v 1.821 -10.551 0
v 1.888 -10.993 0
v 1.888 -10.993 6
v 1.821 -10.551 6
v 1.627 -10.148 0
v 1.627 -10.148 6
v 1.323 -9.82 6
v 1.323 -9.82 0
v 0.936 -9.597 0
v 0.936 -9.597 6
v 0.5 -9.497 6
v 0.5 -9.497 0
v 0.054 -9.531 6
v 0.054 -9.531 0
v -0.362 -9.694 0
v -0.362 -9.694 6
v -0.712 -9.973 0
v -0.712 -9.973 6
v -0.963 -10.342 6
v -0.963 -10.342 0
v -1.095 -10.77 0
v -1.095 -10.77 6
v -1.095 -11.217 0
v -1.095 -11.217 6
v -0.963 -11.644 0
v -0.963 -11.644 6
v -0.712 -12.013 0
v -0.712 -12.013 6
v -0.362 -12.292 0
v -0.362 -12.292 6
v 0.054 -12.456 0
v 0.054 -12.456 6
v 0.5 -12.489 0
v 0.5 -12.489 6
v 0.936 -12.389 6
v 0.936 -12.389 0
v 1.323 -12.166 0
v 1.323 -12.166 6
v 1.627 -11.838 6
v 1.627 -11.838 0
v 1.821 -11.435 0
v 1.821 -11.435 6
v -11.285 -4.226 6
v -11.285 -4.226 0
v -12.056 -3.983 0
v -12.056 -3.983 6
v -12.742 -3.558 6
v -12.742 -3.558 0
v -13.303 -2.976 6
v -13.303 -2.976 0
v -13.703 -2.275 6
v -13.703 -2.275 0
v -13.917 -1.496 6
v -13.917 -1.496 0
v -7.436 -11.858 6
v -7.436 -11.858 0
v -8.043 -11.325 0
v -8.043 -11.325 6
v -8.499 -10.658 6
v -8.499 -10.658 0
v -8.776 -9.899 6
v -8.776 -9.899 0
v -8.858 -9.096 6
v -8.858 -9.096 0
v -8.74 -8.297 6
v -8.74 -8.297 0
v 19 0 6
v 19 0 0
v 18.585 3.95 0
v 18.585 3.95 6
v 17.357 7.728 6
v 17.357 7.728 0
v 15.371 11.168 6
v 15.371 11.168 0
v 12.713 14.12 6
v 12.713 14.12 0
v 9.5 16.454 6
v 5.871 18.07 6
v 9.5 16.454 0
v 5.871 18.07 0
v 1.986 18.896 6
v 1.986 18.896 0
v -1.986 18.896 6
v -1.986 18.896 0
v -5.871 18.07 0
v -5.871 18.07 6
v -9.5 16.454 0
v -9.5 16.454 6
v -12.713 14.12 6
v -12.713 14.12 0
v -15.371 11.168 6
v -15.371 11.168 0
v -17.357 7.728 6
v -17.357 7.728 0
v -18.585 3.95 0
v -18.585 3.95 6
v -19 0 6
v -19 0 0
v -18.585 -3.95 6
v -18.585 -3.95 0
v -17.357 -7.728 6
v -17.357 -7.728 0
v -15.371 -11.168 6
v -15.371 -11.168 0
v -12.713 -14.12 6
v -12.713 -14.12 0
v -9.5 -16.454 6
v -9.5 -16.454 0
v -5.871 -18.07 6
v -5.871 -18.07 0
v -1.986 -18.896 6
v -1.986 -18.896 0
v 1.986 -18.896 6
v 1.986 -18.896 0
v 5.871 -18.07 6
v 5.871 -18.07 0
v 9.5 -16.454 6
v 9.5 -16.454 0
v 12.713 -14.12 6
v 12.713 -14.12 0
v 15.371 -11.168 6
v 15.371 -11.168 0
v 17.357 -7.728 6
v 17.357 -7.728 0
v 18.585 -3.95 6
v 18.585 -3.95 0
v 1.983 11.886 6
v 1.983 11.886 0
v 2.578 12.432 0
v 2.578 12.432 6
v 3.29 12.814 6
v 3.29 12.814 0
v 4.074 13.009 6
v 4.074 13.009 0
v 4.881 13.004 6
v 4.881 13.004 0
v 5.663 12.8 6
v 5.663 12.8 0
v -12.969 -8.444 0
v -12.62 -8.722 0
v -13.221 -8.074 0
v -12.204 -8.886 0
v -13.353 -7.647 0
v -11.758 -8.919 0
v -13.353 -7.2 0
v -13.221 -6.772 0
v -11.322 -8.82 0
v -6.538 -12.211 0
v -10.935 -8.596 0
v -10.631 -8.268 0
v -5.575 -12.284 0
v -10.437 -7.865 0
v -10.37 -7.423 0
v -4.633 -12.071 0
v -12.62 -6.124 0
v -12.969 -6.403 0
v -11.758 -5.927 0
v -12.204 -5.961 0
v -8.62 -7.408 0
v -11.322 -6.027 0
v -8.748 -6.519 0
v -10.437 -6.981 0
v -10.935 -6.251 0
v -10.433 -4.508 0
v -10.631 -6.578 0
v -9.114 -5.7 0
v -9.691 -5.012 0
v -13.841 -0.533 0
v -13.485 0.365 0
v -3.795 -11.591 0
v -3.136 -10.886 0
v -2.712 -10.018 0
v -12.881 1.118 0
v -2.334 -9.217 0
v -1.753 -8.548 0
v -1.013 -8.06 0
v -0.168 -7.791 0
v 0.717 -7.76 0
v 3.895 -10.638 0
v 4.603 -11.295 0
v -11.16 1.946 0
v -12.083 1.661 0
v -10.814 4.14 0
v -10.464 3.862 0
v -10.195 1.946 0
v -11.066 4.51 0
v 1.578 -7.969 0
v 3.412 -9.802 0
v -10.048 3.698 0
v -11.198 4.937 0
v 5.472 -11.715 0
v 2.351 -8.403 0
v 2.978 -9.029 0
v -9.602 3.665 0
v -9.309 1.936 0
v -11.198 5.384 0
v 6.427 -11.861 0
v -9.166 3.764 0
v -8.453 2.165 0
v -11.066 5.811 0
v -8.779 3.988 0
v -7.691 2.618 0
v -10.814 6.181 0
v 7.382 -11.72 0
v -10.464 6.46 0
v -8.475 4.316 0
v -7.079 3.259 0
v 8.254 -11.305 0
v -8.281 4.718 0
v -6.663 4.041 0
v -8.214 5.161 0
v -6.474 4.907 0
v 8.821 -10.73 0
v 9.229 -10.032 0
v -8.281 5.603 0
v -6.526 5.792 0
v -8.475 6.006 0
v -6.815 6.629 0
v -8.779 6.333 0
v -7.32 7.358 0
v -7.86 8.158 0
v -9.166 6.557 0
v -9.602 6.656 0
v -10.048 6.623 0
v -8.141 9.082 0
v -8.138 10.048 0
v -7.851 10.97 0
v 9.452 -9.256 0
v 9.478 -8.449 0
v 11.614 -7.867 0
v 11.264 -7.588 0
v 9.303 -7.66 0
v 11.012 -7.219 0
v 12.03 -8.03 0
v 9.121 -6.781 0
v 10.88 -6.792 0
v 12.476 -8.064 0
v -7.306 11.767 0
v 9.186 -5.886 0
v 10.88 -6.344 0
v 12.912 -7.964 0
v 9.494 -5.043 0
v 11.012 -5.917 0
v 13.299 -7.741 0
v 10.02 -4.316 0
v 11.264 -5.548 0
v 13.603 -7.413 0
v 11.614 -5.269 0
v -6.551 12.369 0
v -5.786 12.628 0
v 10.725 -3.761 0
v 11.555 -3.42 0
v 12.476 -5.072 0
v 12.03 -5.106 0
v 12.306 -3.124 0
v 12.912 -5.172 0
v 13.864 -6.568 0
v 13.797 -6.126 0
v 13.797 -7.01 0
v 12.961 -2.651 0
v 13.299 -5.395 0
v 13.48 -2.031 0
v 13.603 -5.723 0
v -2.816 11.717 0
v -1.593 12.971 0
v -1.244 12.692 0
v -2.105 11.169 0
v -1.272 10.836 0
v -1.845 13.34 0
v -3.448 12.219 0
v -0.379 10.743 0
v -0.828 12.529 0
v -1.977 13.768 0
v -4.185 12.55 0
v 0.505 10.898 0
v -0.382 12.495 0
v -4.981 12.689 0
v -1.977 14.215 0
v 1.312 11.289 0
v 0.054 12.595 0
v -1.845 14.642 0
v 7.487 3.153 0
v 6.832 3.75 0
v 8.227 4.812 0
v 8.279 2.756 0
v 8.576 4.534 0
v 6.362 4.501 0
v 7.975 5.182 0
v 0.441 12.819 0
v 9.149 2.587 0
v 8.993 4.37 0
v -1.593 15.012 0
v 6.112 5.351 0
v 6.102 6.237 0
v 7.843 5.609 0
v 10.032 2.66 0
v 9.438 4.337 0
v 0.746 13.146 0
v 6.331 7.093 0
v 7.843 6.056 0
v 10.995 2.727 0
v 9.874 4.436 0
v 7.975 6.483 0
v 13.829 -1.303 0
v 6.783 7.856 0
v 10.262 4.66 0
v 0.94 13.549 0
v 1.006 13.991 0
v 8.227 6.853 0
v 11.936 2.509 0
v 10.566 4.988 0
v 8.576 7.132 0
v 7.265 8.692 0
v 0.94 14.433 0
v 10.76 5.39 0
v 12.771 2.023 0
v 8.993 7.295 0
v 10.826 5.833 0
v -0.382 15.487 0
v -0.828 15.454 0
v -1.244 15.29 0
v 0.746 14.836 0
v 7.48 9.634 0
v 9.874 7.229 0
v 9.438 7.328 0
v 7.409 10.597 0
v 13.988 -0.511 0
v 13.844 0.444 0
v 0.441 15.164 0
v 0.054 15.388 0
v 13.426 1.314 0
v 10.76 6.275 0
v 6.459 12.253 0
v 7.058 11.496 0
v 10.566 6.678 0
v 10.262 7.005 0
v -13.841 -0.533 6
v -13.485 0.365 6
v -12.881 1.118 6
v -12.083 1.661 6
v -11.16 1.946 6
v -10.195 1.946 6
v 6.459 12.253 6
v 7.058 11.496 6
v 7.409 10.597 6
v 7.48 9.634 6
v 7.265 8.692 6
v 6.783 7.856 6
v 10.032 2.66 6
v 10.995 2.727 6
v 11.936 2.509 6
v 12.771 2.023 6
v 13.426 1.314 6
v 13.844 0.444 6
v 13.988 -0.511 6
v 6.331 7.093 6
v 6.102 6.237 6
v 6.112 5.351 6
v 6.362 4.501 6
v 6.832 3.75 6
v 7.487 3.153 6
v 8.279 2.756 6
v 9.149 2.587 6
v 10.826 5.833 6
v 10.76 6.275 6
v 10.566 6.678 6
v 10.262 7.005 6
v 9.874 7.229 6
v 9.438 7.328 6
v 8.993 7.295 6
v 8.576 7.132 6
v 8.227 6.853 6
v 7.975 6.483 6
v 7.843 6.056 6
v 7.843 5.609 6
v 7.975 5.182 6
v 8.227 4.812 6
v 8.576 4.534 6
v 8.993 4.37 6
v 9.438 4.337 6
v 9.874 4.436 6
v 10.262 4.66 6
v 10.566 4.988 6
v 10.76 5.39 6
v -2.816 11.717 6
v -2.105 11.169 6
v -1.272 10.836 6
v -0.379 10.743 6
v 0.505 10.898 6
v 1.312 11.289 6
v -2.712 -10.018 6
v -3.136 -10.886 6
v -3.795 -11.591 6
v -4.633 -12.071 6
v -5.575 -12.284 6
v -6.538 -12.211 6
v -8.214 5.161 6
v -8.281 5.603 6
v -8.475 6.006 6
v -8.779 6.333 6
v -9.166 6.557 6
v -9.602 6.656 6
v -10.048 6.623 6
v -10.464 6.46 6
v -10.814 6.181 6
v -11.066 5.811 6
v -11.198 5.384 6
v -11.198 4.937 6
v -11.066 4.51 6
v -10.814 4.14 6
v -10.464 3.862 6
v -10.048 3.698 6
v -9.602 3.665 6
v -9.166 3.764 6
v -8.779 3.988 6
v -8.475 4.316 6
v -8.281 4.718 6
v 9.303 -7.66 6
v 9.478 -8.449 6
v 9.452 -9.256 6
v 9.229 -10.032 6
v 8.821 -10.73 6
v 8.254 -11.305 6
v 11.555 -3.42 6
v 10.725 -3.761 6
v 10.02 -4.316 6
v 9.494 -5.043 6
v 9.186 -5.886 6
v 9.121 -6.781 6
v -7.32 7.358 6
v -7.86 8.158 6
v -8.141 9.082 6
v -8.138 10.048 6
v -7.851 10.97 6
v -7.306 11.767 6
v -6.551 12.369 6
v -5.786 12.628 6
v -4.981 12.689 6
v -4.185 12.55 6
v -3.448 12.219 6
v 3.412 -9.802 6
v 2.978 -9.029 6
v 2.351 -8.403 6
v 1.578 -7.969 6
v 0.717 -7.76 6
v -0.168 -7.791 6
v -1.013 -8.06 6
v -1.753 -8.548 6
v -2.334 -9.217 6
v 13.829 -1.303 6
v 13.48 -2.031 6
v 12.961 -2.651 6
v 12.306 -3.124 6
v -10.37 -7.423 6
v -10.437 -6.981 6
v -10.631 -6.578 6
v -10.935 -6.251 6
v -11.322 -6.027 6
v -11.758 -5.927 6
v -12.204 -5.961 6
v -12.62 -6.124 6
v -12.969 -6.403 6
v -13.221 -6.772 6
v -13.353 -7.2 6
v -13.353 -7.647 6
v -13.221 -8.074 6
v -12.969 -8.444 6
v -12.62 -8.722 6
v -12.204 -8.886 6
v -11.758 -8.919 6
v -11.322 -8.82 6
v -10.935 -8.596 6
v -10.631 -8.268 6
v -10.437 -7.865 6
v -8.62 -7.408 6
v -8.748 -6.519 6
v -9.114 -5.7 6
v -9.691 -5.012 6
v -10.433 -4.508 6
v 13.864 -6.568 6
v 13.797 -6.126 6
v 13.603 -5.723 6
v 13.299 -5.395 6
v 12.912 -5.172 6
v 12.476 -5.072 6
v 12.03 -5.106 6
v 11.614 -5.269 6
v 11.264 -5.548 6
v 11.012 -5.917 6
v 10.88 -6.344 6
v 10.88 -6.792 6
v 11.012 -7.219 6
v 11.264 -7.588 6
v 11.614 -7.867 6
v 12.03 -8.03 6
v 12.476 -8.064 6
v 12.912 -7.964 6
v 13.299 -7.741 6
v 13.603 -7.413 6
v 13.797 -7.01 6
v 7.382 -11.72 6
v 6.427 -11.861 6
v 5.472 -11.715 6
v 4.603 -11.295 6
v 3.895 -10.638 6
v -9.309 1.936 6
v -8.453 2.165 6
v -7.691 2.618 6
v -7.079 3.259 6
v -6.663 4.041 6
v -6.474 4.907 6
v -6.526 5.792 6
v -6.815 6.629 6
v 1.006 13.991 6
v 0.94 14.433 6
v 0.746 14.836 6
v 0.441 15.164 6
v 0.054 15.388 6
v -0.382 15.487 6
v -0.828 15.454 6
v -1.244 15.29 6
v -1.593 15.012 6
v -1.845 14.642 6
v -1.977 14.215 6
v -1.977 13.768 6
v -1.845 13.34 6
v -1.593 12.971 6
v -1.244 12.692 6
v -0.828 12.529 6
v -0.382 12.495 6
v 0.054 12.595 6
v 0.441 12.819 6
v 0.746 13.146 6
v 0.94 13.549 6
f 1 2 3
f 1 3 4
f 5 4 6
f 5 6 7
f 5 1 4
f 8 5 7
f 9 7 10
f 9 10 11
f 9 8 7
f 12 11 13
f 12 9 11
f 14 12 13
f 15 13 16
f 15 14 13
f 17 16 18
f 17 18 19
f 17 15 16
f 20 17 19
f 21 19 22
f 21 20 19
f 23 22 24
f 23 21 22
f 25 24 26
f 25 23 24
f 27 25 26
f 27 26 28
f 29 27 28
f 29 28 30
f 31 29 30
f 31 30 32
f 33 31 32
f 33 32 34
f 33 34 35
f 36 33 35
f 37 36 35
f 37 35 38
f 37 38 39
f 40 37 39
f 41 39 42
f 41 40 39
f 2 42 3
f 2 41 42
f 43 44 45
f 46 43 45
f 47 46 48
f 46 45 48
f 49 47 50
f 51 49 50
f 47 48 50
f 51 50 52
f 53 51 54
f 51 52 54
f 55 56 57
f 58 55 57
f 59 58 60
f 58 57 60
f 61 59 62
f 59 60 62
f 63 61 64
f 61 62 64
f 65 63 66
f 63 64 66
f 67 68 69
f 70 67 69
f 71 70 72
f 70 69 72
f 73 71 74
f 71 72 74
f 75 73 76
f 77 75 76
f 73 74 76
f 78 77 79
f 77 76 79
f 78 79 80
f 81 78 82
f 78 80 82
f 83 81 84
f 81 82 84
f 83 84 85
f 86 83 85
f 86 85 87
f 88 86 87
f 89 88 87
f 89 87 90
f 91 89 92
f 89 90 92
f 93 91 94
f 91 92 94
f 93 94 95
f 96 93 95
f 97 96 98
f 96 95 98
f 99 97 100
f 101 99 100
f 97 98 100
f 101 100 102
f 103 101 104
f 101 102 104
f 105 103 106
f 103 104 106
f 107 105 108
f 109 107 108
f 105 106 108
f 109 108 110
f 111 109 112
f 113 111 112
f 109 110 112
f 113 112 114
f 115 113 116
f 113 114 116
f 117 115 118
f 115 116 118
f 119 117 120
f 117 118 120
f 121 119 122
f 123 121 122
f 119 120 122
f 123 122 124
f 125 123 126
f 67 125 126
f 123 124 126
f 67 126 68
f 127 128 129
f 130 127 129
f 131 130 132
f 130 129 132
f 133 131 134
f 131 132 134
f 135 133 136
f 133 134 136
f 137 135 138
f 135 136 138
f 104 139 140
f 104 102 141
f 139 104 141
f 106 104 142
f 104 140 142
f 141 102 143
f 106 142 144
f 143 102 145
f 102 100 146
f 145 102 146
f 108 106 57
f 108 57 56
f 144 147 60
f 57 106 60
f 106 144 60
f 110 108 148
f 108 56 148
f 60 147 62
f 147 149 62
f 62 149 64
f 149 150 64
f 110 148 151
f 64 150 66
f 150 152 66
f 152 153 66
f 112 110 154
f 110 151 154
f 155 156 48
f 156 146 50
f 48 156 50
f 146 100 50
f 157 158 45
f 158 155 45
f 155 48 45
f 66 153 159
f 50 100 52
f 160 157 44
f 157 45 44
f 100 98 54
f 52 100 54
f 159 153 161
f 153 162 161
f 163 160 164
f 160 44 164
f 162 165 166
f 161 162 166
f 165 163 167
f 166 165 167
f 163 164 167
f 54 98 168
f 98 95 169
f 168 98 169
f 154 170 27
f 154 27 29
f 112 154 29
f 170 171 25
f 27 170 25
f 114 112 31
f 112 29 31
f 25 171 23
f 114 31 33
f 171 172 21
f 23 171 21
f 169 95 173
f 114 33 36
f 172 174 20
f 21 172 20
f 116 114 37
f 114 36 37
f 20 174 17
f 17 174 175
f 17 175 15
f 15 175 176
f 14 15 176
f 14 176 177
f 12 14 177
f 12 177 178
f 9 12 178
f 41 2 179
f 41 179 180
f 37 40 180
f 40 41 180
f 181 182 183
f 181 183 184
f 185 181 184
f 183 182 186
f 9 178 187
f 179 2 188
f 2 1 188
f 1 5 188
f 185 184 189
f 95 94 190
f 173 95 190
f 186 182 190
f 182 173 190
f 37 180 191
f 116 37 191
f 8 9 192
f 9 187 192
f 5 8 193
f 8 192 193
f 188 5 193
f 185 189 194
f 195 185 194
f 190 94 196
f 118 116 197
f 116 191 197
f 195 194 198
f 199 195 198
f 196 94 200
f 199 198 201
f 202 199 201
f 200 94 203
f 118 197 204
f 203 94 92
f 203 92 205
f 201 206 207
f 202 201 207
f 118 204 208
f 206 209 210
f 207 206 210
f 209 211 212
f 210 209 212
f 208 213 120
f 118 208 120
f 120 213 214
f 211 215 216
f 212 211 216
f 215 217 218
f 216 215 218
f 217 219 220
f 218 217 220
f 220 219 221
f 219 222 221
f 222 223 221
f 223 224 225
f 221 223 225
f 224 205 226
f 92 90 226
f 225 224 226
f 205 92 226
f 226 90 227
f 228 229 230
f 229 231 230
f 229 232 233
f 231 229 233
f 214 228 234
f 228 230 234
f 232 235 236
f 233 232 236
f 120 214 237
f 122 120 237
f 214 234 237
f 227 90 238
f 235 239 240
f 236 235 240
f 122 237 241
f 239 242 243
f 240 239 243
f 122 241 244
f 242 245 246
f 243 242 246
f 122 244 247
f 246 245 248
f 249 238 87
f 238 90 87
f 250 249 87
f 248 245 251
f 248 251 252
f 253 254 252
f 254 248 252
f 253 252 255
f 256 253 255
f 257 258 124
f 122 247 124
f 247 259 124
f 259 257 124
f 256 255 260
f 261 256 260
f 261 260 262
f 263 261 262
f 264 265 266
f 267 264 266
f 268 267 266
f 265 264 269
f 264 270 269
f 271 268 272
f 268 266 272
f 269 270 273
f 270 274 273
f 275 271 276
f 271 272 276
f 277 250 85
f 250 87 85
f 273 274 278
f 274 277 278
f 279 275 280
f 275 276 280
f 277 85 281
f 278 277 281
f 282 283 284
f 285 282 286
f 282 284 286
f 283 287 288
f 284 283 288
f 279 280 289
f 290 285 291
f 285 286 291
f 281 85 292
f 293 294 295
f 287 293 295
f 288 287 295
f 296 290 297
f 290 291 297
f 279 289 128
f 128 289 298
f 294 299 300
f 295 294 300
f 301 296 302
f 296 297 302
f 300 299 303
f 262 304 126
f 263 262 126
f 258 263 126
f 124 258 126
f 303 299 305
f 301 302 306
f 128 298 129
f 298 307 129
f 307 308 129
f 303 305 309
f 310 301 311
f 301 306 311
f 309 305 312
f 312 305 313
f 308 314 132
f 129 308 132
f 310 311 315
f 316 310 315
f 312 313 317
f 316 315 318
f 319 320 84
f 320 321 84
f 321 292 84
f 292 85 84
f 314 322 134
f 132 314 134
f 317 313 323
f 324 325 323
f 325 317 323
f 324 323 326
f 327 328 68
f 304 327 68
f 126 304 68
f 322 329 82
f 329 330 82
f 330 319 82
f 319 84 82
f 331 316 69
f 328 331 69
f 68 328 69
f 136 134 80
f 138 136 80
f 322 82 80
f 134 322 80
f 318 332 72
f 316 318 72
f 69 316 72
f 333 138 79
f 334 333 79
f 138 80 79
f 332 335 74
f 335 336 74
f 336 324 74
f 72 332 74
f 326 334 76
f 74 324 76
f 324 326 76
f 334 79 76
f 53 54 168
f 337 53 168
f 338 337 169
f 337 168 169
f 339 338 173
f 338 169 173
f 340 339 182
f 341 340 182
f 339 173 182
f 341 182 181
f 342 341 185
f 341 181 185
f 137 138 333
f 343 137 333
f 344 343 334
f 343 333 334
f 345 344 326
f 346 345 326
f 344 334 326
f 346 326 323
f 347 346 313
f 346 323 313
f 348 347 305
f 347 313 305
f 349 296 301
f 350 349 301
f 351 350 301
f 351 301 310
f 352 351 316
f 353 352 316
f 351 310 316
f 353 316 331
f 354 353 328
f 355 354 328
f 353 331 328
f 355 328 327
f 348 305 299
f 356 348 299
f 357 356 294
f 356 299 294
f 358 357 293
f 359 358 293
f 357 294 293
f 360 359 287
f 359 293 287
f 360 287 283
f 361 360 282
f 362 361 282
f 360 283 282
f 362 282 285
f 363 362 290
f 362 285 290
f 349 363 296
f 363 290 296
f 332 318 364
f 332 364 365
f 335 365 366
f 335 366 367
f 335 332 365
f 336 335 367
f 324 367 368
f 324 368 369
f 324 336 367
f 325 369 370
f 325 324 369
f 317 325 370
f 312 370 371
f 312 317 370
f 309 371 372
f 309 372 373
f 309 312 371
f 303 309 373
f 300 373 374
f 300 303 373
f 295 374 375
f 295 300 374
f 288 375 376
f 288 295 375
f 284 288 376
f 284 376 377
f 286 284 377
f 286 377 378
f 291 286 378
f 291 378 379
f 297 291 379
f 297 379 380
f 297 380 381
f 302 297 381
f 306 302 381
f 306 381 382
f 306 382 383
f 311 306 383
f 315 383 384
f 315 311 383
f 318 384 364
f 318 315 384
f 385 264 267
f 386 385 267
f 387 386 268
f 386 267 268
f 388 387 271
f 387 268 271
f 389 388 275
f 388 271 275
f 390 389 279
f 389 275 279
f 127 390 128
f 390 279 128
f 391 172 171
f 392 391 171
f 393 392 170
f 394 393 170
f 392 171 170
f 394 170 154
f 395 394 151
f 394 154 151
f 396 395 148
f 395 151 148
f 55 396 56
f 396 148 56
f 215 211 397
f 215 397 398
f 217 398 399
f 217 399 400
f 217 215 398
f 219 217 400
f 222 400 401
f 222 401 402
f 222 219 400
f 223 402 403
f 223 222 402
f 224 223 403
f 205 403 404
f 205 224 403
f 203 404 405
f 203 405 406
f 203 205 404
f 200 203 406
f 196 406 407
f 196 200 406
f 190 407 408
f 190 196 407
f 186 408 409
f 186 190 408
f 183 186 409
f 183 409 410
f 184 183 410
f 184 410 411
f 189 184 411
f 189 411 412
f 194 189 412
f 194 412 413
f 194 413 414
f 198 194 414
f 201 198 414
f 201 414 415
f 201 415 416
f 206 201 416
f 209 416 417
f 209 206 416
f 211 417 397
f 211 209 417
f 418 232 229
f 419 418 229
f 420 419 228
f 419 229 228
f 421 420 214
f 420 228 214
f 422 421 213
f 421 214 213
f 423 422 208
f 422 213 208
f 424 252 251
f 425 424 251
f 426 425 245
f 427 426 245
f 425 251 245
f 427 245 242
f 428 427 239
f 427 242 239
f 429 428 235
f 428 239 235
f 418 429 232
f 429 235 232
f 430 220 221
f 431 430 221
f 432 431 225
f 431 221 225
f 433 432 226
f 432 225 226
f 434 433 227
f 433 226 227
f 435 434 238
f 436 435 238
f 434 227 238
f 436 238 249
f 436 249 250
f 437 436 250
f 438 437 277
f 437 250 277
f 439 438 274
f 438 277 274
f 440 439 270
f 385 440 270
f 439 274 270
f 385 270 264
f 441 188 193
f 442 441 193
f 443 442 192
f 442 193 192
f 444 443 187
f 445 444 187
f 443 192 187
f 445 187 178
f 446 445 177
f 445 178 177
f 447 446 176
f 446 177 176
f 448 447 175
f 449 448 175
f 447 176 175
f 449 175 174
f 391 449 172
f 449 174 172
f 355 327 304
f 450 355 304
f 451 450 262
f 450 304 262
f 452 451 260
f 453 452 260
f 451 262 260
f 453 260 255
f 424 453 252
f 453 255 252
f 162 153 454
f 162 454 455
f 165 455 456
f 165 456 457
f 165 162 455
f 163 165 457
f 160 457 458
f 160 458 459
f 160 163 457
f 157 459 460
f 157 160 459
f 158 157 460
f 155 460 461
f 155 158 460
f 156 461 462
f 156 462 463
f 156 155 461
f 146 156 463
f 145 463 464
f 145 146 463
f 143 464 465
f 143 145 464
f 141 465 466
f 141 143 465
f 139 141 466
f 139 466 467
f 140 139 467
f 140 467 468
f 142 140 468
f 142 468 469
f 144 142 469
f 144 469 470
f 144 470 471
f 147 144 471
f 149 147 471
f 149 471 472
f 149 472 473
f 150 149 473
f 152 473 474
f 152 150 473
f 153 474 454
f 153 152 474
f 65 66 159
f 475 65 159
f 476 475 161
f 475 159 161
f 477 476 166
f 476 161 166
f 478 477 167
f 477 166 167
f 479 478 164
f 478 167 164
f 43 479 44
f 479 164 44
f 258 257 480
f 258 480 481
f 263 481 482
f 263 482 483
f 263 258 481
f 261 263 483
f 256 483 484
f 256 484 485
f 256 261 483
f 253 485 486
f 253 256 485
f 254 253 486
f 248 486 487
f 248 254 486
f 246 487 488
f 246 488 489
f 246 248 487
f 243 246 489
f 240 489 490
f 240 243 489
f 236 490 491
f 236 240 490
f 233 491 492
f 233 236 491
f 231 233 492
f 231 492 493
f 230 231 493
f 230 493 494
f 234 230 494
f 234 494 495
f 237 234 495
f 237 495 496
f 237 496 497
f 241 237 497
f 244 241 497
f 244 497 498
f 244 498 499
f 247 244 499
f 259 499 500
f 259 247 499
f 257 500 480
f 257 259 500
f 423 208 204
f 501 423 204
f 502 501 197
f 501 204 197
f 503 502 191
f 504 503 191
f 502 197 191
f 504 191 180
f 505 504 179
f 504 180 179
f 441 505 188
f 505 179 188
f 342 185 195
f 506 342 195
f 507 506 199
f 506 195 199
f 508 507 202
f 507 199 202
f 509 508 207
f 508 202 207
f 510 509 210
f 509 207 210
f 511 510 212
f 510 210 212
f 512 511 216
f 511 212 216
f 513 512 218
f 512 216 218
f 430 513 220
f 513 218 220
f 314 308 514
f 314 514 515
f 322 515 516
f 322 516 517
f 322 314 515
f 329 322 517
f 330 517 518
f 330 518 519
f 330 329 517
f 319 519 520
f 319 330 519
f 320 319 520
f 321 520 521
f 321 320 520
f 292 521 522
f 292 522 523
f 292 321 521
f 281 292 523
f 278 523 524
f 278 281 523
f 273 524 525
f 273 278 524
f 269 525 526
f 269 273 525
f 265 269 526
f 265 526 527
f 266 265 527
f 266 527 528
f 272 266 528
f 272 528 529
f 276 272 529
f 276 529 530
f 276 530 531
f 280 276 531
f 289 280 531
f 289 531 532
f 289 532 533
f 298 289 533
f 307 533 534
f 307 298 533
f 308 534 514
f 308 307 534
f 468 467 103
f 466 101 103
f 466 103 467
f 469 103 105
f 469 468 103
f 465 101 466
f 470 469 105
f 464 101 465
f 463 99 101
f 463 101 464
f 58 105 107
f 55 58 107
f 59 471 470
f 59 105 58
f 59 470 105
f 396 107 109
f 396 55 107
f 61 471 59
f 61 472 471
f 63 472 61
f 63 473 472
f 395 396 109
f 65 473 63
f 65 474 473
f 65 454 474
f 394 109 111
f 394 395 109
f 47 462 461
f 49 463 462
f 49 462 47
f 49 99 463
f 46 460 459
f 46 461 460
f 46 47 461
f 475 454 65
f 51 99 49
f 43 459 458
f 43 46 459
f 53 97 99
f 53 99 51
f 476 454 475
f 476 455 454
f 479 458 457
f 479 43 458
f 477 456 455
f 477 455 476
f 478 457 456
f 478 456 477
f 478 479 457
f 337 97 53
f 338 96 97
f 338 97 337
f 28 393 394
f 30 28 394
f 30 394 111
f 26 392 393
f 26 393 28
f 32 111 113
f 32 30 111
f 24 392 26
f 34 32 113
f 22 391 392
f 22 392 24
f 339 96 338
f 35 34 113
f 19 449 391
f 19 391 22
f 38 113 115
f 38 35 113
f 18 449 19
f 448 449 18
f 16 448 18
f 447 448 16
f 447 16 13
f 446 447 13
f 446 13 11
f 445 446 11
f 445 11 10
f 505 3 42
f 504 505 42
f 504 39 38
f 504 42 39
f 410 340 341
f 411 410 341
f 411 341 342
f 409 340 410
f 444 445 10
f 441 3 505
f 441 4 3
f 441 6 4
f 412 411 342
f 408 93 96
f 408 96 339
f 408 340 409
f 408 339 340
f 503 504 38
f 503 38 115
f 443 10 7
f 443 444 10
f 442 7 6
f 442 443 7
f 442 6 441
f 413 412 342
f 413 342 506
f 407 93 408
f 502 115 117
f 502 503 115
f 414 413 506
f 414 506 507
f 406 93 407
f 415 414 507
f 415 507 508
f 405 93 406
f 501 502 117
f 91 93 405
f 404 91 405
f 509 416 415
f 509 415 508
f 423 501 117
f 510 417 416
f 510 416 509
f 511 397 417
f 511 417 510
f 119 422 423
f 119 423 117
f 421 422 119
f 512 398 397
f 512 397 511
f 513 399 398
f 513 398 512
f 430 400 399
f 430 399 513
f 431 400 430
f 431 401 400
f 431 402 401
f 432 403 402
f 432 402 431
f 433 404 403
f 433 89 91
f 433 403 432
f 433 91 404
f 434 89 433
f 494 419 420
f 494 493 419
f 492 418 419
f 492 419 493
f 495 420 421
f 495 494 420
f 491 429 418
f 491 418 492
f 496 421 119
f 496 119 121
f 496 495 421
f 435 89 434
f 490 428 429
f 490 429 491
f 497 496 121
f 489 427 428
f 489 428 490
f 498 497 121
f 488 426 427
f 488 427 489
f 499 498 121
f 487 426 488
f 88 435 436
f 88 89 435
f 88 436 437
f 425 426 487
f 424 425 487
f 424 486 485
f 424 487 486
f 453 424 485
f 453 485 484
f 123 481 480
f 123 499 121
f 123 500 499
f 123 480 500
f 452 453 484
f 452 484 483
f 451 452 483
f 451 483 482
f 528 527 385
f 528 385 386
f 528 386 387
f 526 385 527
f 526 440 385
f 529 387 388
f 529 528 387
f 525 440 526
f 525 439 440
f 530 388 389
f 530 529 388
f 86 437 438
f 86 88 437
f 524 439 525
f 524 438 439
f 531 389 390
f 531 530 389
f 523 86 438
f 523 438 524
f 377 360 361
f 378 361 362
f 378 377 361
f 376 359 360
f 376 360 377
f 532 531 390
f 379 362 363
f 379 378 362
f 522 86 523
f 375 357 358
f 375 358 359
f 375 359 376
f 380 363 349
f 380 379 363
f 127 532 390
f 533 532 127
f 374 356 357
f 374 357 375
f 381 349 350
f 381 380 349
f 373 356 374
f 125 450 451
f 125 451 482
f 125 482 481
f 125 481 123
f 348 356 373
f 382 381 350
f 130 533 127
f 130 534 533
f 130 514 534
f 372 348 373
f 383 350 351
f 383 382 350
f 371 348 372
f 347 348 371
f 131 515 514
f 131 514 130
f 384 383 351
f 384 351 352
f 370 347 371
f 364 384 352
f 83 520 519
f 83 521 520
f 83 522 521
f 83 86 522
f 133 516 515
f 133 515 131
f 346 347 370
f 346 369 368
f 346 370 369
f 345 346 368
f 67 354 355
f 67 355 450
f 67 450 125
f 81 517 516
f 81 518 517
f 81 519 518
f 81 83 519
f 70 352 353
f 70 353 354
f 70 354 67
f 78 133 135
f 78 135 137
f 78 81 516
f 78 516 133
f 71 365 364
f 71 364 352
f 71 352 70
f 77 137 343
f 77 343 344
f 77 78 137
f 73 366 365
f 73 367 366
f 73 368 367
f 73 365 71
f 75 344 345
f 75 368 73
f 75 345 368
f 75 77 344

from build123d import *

# Parameters (mm, degrees)
ESQUISSE1_R        = 19
ESQUISSE1_R_2      = 1.5
BOSS_EXTRU_2_DEPTH = 6


with BuildPart() as part:
    # Esquisse1 → Boss.-Extru.2 (new body)
    with BuildSketch(Plane.XY):
        Circle(ESQUISSE1_R)
        with Locations((-0.493805045, 13.991288596)):
            Circle(ESQUISSE1_R_2, mode=Mode.SUBTRACT)
        with Locations((12.363713879, -6.567996584)):
            Circle(ESQUISSE1_R_2, mode=Mode.SUBTRACT)
        with Locations((-11.869908833, -7.423292012)):
            Circle(ESQUISSE1_R_2, mode=Mode.SUBTRACT)
        with Locations((-9.714346619, 5.160568745)):
            Circle(ESQUISSE1_R_2, mode=Mode.SUBTRACT)
        with Locations((9.32635694, 5.832586581)):
            Circle(ESQUISSE1_R_2, mode=Mode.SUBTRACT)
        with Locations((0.387989679, -10.993155325)):
            Circle(ESQUISSE1_R_2, mode=Mode.SUBTRACT)
        with BuildLine():
            ThreePointArc((-2.815595301, 11.717131607), (-0.379171731, 10.743310886), (1.982535482, 11.886475637))
            ThreePointArc((1.982535482, 11.886475637), (3.675716254, 12.935891711), (5.663115611, 12.800322476))
            ThreePointArc((5.663115611, 12.800322476), (7.409047573, 10.596596907), (6.782830345, 7.855696182))
            ThreePointArc((6.782830345, 7.855696182), (6.57084239, 4.109322364), (10.032070946, 2.660132051))
            ThreePointArc((10.032070946, 2.660132051), (12.770566856, 2.023480694), (13.987784639, -0.510896087))
            ThreePointArc((13.987784639, -0.510896087), (13.239790253, -2.357146239), (11.555131282, -3.420188746))
            ThreePointArc((11.555131282, -3.420188746), (9.493566014, -5.043283091), (9.302722122, -7.66016391))
            ThreePointArc((9.302722122, -7.66016391), (9.364952716, -9.651209509), (8.253846635, -11.304563222))
            ThreePointArc((8.253846635, -11.304563222), (5.472398329, -11.71472187), (3.411817286, -9.80195148))
            ThreePointArc((3.411817286, -9.80195148), (0.273356364, -7.745177616), (-2.712293539, -10.018094318))
            ThreePointArc((-2.712293539, -10.018094318), (-4.632897743, -12.071375665), (-7.436341309, -11.858328797))
            ThreePointArc((-7.436341309, -11.858328797), (-8.66124365, -10.287421581), (-8.739535981, -8.296942861))
            ThreePointArc((-8.739535981, -8.296942861), (-9.114394283, -5.700027795), (-11.285257604, -4.226311727))
            ThreePointArc((-11.285257604, -4.226311727), (-13.04066897, -3.284682203), (-13.916962247, -1.495759254))
            ThreePointArc((-13.916962247, -1.495759254), (-12.881445902, 1.118124963), (-10.194647631, 1.946255297))
            ThreePointArc((-10.194647631, 1.946255297), (-6.844198754, 3.635855252), (-7.319777407, 7.357962266))
            ThreePointArc((-7.319777407, 7.357962266), (-8.137669113, 10.047894971), (-6.55144333, 12.369224883))
            ThreePointArc((-6.55144333, 12.369224883), (-4.578546604, 12.64456782), (-2.815595301, 11.717131607))
        make_face(mode=Mode.SUBTRACT)
    extrude(amount=BOSS_EXTRU_2_DEPTH)


solid = part.part
